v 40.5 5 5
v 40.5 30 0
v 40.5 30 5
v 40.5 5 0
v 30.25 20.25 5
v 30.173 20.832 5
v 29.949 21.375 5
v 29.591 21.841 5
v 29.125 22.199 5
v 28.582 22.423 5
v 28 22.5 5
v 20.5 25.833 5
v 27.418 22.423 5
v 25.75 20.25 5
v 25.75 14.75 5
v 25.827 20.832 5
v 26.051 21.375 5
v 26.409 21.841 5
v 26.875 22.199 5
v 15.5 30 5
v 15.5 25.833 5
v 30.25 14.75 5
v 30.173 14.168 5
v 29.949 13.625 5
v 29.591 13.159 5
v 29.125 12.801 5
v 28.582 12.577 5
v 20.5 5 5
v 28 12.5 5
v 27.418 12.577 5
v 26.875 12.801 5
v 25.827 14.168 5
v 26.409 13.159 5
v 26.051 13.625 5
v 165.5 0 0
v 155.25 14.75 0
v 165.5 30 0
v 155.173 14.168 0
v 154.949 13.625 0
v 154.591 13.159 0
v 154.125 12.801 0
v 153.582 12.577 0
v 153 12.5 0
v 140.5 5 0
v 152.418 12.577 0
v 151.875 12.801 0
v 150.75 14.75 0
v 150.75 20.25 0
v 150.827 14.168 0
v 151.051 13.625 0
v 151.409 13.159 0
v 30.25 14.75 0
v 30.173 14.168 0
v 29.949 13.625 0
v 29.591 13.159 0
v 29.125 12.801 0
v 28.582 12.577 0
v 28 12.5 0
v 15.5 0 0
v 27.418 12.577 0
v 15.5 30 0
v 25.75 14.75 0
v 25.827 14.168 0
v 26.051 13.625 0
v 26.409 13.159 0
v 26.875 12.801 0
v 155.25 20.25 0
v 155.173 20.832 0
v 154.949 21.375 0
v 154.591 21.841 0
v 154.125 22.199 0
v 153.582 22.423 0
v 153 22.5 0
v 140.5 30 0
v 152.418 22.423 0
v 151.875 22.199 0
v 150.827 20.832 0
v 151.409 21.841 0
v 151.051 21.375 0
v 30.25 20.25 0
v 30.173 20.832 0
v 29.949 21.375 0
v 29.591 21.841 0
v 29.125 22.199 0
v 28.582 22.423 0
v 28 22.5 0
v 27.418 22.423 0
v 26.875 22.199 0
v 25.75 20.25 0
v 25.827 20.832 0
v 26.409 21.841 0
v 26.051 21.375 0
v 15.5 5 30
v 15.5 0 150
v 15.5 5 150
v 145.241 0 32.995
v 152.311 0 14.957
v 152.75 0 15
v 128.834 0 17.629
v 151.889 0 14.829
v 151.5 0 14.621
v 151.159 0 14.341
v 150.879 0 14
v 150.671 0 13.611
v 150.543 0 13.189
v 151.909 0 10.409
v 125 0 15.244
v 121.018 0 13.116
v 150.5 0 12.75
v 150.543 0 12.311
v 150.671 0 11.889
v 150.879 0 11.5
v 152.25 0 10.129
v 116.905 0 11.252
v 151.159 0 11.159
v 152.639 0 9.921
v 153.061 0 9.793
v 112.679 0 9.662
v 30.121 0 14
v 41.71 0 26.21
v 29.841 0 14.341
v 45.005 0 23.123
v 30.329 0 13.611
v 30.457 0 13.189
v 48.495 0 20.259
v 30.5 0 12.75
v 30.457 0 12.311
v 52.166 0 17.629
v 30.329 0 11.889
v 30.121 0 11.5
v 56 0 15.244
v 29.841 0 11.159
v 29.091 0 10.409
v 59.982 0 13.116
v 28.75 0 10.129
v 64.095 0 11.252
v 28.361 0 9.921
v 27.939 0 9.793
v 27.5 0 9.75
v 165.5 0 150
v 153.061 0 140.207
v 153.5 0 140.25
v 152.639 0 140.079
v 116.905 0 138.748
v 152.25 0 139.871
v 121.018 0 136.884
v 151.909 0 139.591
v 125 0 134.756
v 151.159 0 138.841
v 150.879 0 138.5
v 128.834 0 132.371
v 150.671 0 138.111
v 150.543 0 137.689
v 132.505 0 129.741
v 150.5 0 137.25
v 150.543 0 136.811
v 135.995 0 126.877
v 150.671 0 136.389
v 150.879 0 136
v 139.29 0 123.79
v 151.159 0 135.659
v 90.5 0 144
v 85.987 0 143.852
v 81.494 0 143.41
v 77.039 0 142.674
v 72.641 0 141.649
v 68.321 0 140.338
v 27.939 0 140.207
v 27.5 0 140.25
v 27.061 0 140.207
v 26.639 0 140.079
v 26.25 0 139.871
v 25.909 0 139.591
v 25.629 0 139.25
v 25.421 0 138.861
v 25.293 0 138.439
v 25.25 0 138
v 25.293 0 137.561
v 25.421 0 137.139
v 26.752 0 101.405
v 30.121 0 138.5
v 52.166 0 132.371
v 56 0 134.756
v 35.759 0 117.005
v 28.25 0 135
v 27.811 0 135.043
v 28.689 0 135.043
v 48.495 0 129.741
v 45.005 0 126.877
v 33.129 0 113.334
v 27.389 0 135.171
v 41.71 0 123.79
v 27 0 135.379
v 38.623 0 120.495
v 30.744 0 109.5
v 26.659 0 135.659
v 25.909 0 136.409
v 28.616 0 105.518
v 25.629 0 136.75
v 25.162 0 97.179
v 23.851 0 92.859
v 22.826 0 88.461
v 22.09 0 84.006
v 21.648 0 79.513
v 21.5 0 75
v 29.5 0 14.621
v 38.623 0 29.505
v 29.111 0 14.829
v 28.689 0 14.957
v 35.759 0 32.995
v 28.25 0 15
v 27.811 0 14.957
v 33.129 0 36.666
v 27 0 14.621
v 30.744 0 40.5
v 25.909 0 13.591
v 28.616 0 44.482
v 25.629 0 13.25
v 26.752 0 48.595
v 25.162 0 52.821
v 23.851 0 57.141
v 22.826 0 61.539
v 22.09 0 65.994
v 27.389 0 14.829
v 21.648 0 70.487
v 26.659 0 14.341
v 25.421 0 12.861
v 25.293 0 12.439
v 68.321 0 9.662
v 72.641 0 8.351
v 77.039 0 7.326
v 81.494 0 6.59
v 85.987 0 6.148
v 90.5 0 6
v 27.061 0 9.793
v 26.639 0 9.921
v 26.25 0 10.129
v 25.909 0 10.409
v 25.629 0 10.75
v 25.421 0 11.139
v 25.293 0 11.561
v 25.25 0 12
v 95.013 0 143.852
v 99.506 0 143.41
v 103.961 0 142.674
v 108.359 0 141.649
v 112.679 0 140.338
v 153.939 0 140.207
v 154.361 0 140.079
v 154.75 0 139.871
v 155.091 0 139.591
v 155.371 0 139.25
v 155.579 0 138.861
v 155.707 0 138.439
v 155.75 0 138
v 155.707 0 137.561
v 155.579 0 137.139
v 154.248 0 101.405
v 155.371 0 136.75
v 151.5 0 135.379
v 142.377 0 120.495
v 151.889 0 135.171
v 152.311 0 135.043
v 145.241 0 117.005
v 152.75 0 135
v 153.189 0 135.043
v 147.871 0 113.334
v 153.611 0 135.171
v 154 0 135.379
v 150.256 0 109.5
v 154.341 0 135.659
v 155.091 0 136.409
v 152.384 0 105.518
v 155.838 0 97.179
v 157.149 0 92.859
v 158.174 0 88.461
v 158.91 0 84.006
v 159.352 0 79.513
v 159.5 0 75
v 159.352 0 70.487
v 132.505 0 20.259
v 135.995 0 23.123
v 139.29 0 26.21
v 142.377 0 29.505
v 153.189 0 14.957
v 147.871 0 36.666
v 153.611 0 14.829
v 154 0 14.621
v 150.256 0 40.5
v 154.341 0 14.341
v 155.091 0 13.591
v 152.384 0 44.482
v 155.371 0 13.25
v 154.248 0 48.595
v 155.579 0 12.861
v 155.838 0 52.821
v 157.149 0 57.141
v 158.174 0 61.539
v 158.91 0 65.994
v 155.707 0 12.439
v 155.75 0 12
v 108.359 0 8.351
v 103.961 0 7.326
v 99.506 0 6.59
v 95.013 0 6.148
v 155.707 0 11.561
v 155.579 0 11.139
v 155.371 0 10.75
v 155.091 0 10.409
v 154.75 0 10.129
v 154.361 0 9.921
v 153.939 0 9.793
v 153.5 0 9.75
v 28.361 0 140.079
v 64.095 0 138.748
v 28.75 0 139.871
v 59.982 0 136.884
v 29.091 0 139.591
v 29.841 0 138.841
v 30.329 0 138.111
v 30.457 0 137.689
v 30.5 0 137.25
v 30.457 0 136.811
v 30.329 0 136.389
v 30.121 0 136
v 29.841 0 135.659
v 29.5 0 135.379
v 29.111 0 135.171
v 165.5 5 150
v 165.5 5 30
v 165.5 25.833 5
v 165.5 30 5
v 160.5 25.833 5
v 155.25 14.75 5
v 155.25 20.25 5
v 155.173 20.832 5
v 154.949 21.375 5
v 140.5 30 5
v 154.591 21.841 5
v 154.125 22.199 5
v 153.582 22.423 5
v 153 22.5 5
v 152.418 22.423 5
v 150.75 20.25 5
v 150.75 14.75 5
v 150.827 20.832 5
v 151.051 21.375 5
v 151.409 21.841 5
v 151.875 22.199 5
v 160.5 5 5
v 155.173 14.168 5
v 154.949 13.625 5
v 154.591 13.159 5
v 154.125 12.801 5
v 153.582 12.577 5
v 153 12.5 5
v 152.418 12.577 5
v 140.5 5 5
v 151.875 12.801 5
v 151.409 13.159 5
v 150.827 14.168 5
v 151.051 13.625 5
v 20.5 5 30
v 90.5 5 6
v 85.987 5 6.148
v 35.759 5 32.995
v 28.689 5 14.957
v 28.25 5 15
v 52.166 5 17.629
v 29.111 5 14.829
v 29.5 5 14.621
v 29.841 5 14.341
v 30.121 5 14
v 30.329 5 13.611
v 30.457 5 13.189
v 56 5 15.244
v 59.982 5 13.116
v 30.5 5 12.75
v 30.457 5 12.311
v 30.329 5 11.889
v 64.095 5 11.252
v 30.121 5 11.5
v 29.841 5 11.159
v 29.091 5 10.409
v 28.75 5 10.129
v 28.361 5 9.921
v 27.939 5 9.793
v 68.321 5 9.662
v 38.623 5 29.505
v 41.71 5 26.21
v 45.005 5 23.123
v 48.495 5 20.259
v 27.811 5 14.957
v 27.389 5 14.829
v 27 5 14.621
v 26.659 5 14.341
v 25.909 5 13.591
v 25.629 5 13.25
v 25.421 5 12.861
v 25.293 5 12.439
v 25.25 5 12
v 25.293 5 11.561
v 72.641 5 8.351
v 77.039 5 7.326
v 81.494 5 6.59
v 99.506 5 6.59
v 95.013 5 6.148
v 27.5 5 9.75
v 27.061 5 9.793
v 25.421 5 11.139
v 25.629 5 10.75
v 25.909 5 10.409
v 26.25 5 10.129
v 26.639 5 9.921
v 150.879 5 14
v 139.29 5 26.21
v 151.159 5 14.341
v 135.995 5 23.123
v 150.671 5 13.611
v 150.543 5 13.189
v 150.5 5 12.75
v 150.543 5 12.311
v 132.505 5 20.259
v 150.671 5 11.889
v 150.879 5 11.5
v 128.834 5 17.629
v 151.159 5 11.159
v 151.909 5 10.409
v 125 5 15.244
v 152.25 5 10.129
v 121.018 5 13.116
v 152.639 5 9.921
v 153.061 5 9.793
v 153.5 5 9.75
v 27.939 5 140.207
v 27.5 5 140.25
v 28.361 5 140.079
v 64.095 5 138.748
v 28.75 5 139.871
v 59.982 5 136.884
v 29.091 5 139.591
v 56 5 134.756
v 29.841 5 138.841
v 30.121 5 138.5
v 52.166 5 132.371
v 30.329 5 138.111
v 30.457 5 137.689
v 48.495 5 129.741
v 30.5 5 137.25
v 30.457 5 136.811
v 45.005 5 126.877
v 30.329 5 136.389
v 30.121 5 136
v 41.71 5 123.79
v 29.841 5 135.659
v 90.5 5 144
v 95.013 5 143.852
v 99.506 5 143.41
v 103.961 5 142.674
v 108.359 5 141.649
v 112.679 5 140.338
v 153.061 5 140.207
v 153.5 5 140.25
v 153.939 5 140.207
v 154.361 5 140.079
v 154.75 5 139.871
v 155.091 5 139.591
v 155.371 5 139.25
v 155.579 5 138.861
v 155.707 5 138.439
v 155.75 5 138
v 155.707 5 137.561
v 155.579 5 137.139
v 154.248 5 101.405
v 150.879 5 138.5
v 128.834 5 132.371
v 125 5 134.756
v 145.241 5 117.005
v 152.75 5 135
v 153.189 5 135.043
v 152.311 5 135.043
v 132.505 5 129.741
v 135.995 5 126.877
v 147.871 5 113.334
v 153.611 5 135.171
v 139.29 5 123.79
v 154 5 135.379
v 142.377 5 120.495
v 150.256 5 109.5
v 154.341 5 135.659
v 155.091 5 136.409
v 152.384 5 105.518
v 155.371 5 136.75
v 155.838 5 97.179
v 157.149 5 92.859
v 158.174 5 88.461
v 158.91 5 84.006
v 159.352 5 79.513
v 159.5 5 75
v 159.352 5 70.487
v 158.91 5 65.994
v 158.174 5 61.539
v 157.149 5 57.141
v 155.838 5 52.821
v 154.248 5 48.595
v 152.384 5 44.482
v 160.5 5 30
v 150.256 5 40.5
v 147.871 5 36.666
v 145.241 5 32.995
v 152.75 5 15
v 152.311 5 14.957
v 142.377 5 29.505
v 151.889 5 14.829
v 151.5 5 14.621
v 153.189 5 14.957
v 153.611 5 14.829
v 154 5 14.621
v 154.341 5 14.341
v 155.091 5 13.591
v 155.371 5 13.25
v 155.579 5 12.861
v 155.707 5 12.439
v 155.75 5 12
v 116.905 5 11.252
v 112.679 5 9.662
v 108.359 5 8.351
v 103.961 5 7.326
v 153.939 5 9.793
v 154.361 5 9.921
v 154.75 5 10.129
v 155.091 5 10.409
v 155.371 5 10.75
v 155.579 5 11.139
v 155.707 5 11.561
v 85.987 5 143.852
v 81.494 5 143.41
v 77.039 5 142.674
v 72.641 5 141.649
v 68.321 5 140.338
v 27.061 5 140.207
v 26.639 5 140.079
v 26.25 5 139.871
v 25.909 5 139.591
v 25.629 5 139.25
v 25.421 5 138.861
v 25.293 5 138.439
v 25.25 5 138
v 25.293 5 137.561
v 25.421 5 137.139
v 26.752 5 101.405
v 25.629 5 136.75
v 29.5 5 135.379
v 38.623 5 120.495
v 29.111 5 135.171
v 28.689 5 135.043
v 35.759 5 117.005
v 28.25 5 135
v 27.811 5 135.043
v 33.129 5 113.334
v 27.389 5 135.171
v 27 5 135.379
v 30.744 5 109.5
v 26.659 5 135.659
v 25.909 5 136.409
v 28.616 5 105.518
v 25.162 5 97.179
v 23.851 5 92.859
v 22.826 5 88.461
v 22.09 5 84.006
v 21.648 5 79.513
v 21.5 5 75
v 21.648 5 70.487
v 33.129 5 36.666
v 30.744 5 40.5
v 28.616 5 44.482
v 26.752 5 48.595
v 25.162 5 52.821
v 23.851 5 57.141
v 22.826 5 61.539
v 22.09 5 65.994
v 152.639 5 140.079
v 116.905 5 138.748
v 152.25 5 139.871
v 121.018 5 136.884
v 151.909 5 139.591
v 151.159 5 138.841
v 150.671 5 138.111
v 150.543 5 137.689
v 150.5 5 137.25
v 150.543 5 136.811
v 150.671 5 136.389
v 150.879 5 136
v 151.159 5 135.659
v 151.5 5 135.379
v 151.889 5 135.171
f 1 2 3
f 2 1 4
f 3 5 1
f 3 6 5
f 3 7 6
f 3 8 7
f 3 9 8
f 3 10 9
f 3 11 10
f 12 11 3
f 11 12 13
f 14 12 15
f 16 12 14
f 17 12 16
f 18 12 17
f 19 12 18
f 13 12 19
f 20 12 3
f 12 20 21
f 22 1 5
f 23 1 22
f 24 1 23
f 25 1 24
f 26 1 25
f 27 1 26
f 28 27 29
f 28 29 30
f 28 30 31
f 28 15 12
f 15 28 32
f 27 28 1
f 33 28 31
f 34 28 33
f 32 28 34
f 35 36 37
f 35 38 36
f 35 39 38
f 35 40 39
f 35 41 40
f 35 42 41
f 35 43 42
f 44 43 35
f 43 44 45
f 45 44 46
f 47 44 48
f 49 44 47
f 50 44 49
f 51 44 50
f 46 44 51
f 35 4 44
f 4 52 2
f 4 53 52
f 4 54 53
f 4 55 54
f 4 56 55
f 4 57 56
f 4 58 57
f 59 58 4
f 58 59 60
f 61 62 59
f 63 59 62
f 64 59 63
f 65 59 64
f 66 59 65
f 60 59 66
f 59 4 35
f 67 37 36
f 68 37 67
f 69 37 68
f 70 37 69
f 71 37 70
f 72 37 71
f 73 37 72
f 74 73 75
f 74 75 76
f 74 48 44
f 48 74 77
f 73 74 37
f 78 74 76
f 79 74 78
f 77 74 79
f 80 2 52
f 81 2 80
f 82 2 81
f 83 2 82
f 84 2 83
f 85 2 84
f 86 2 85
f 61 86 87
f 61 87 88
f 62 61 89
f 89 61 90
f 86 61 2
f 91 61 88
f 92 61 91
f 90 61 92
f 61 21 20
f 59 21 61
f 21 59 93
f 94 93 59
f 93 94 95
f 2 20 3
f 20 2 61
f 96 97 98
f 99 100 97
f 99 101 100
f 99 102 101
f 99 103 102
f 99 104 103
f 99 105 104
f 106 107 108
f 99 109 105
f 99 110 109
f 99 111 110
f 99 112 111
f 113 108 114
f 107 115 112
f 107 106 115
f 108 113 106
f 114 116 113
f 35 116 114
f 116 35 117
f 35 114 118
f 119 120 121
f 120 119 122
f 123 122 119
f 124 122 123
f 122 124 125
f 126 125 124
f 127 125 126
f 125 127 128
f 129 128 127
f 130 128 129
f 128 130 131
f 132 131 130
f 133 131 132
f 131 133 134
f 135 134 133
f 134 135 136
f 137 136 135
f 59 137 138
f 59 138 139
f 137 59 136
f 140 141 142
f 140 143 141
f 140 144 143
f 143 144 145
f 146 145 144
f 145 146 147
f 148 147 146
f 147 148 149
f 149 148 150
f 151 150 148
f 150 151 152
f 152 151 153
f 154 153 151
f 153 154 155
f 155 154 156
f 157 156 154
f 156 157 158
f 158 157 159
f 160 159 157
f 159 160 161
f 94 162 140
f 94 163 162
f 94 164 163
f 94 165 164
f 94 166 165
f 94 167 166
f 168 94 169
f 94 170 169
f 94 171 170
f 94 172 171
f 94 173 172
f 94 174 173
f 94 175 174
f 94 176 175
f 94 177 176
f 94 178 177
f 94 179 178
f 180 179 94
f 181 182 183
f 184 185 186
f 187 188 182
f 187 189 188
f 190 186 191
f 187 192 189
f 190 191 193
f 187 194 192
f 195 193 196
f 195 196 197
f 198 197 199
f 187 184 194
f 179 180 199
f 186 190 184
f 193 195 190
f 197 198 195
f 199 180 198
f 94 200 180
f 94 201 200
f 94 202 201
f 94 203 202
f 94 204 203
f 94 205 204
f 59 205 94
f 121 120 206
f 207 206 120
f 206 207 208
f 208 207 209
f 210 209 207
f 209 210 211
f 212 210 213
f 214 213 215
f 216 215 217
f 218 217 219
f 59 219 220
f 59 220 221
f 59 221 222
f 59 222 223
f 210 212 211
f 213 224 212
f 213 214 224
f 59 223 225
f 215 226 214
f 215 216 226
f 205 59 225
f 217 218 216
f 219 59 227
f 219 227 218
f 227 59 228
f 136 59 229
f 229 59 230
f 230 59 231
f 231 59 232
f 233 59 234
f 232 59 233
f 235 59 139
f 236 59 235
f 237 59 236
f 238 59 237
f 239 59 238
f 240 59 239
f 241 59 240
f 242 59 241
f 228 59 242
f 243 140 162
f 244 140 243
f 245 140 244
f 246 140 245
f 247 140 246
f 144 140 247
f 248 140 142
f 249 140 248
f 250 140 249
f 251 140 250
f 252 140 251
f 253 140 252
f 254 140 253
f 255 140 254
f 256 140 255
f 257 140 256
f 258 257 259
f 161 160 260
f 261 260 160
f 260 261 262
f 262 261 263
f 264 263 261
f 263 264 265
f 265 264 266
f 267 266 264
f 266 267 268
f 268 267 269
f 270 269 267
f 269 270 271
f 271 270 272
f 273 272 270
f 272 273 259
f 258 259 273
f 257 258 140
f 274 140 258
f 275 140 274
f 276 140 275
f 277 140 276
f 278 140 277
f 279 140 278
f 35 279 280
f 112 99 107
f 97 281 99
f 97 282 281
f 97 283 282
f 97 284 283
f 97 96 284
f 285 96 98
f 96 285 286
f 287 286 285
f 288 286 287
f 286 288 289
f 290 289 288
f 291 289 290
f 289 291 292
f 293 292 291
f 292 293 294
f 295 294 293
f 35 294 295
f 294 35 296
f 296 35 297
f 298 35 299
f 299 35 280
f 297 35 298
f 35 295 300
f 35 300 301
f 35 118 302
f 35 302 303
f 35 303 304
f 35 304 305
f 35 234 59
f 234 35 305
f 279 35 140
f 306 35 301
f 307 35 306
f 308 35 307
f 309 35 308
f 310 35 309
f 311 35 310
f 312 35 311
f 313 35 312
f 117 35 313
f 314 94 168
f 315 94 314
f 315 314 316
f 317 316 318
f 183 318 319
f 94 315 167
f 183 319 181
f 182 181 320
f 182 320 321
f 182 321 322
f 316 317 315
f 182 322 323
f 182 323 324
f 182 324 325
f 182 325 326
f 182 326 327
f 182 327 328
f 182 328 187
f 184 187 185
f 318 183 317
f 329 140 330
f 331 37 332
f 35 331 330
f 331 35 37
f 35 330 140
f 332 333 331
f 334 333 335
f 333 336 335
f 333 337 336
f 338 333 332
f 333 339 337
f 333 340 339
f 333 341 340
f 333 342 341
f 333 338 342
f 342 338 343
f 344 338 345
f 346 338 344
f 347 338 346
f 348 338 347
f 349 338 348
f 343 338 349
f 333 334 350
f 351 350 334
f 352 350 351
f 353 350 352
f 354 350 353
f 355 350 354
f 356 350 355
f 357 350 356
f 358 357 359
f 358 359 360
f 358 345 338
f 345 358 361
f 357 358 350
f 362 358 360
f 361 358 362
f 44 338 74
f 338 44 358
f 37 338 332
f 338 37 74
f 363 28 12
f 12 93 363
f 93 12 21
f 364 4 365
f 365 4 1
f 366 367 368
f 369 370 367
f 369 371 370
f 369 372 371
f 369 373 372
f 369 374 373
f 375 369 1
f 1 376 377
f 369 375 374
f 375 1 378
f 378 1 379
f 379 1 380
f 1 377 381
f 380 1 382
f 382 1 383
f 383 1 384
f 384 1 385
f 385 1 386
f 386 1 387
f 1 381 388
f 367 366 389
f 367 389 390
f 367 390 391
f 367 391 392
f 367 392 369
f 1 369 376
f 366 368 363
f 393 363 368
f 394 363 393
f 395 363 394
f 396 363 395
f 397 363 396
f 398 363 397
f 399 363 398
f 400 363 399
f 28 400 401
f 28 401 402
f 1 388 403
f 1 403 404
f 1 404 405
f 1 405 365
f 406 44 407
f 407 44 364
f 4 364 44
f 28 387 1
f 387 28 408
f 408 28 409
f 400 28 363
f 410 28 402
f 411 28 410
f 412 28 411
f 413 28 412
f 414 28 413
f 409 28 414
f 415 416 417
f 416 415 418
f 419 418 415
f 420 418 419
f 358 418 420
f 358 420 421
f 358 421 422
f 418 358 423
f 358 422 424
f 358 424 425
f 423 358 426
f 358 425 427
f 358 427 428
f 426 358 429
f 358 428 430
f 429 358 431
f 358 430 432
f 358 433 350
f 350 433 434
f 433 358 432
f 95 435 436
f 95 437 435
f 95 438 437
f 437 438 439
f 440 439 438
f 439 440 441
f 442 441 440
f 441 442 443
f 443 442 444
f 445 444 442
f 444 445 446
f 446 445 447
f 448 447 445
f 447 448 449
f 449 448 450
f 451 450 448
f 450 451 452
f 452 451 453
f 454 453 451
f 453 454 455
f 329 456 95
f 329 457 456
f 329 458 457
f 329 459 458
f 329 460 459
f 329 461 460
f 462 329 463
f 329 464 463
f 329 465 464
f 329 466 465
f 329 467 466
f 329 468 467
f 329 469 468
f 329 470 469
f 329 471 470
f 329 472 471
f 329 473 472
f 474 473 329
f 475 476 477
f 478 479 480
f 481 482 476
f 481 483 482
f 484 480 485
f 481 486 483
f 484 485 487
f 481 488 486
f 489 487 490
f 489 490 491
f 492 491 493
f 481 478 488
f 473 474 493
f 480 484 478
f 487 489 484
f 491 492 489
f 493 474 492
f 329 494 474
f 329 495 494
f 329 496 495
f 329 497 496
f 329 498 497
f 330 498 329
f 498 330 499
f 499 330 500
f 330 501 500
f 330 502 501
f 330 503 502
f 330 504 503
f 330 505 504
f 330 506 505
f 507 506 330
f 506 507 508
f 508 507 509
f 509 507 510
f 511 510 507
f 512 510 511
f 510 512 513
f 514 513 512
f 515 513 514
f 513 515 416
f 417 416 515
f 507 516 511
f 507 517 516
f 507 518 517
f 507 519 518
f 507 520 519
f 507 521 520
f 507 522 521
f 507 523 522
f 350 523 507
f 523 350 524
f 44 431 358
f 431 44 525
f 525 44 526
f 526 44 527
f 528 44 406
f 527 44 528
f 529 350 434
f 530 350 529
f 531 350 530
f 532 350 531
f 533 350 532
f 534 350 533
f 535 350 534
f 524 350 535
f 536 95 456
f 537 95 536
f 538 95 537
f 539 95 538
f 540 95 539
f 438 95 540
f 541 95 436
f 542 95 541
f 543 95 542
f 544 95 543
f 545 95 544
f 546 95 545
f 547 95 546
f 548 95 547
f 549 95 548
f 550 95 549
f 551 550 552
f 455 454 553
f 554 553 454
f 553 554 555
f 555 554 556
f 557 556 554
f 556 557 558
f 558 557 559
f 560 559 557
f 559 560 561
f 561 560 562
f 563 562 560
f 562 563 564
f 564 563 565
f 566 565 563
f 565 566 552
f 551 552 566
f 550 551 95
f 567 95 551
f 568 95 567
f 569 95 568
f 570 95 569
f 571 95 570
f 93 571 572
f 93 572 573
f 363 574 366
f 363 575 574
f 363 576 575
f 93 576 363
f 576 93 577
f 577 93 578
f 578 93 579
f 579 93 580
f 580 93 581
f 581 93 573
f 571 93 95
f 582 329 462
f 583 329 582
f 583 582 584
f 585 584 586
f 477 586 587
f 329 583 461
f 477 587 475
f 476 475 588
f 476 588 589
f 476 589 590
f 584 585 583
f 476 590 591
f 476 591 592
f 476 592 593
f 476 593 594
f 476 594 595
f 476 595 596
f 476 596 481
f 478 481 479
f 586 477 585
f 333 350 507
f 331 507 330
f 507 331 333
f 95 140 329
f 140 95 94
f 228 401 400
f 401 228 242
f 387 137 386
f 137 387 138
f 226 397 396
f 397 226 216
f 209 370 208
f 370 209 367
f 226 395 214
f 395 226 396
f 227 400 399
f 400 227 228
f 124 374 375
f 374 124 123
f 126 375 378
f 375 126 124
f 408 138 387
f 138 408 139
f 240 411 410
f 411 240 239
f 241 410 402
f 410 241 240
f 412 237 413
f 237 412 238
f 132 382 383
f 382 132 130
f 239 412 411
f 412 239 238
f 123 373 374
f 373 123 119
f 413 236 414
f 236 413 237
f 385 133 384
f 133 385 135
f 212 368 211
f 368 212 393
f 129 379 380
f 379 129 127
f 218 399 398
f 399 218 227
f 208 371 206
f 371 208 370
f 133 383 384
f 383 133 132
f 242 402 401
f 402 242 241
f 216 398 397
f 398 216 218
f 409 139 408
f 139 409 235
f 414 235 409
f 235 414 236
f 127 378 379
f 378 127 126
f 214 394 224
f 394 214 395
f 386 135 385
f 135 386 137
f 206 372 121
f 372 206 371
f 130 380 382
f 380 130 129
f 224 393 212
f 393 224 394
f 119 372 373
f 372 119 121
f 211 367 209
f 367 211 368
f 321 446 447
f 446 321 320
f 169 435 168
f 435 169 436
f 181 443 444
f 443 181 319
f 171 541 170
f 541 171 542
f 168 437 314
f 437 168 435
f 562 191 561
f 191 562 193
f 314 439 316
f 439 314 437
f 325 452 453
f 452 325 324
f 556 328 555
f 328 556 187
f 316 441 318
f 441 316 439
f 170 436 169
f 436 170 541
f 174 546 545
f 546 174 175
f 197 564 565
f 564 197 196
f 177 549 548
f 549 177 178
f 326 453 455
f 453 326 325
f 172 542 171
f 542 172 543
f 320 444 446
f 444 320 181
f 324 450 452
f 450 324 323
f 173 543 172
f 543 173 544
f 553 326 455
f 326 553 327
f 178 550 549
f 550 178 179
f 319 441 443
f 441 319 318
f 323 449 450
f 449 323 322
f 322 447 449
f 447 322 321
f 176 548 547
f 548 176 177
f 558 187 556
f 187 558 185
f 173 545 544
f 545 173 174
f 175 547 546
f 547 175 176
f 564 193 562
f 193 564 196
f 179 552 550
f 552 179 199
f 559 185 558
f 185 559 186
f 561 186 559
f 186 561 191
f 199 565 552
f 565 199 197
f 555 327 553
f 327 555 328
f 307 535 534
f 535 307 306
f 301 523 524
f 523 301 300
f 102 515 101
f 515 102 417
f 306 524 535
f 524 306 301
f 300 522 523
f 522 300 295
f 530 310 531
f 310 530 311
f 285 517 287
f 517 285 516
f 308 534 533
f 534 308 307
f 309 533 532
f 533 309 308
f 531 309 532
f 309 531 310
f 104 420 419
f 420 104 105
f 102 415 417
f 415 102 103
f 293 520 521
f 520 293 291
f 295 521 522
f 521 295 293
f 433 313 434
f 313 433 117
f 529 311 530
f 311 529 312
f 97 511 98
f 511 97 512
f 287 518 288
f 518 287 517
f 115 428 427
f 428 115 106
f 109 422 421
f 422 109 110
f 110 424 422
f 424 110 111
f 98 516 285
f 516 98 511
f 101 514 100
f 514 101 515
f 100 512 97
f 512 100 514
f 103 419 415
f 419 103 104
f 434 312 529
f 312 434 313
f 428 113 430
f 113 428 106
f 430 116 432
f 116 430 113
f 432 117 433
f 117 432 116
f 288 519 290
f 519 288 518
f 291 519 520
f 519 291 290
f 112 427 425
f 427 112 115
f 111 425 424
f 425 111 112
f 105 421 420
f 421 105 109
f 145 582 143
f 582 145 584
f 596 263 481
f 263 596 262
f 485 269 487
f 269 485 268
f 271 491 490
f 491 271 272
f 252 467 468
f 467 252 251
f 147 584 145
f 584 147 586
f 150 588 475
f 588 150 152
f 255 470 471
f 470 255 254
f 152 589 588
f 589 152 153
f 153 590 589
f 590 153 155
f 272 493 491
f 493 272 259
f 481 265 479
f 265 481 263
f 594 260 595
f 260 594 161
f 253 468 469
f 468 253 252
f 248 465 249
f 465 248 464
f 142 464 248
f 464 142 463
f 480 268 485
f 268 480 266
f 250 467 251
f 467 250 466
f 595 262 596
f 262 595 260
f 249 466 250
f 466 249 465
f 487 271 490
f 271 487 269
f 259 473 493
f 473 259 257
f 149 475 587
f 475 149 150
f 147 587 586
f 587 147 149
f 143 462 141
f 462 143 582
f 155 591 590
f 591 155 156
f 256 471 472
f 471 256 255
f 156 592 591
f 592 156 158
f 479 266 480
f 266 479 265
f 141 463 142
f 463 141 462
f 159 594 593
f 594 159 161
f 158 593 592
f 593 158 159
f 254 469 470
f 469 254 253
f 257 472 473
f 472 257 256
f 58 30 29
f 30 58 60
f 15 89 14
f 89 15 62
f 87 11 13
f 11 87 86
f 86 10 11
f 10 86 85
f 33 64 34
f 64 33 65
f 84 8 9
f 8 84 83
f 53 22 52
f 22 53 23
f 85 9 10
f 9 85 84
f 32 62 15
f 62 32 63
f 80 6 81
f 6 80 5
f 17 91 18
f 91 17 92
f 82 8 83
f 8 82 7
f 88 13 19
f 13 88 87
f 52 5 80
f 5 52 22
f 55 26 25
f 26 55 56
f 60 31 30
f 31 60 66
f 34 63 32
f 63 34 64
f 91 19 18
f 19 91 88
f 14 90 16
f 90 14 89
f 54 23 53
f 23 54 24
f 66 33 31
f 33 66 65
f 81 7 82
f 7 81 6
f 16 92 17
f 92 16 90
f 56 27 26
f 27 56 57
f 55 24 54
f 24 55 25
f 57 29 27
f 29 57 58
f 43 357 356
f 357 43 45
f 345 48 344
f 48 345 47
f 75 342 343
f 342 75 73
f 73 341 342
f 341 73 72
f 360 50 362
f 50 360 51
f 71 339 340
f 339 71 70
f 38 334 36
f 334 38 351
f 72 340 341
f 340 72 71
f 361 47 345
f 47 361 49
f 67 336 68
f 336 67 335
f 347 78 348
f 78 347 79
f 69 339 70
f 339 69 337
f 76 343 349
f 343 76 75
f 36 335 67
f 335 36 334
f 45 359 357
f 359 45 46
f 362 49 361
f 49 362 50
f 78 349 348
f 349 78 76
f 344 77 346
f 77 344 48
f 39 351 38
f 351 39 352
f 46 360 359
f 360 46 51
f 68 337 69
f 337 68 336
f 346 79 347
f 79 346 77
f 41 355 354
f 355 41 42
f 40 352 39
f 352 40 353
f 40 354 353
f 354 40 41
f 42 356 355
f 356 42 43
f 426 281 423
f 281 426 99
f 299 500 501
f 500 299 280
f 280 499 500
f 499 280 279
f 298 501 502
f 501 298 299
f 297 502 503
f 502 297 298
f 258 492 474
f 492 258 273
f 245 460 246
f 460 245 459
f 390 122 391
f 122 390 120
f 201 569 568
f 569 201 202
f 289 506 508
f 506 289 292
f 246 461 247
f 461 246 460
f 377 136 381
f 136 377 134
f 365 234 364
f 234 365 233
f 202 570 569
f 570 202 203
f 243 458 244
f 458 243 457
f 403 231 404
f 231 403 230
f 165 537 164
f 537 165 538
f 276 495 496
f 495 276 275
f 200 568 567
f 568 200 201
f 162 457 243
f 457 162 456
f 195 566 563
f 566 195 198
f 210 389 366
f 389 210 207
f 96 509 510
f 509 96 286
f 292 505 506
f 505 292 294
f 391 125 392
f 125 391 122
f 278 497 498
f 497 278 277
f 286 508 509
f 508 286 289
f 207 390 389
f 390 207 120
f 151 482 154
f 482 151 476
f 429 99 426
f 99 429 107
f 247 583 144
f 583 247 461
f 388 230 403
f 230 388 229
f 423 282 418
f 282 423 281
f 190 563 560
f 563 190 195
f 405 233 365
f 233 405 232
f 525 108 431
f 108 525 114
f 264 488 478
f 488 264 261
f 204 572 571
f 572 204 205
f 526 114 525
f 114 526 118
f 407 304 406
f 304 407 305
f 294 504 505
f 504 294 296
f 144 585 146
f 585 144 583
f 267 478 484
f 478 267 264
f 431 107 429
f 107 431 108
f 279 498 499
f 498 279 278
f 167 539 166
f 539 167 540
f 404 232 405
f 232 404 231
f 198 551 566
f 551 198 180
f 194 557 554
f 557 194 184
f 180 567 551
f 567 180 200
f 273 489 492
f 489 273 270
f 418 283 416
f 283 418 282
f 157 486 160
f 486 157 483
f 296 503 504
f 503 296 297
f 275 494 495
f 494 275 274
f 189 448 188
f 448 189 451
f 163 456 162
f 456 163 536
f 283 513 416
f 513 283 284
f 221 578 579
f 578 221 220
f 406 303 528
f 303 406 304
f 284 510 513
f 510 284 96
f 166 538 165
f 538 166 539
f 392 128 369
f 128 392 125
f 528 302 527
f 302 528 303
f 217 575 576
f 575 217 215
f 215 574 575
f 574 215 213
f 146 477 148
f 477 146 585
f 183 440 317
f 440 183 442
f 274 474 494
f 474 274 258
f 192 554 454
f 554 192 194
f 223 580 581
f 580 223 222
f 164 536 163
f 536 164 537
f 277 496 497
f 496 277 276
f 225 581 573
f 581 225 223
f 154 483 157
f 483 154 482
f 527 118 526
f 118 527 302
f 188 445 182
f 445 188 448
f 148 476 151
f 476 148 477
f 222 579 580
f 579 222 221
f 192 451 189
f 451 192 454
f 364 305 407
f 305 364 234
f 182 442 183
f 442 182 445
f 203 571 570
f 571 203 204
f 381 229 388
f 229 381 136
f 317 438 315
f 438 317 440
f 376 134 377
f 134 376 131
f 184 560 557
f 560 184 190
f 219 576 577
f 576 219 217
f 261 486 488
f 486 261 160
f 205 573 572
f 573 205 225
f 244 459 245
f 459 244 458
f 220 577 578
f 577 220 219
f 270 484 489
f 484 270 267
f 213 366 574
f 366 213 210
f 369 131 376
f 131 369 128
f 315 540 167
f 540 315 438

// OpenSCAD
// file: lib/shapes.scad
/*
 * Вспомогательные примитивы. Подключать через use <lib/shapes.scad>.
 */

// Прямоугольник со скруглёнными углами, центрированный в (0,0)
module rrect(w, h, r, fn = 32) {
    r_ = min(r, w / 2 - 0.01, h / 2 - 0.01);
    hull()
        for (sx = [-1, 1], sy = [-1, 1])
            translate([sx * (w / 2 - r_), sy * (h / 2 - r_)])
                circle(r = r_, $fn = fn);
}

// Капсула (slot) длиной l по X, шириной w, центрирована
module slot2d(l, w, fn = 24) {
    hull()
        for (sx = [-1, 1])
            translate([sx * (l - w) / 2, 0]) circle(d = w, $fn = fn);
}

// Скруглённый по вертикальным рёбрам параллелепипед, угол в начале координат
module rbox(size, r, fn = 32) {
    translate([size[0] / 2, size[1] / 2, 0])
        linear_extrude(height = size[2])
            rrect(size[0], size[1], r, fn);
}

// Плавная интерполяция (нулевой наклон на концах → эквивалент большого радиуса)
function smoothstep(t) = t * t * (3 - 2 * t);
function lerp(a, b, t) = a + (b - a) * t;

/*
 * Лофт по Y между двумя скруглёнными прямоугольниками в плоскости XZ.
 * Сечение задано: центр [cx, cz], ширина w, высота h, радиус r.
 * Профиль перехода: smoothstep → тангенциально-непрерывный вход и выход.
 * y0..y1 — продольные координаты. n — число ломтей.
 */
module loft_xz(y0, y1, s0, s1, n = 24, fn = 32) {
    L = y1 - y0;
    for (i = [0 : n - 1]) {
        t0 = i / n;
        t1 = (i + 1) / n;
        hull() {
            section_slab(y0 + t0 * L, s0, s1, smoothstep(t0), fn);
            section_slab(y0 + t1 * L, s0, s1, smoothstep(t1), fn);
        }
    }
}

// Тонкий ломоть сечения на координате y, s = [cx, cz, w, h, r]
module section_slab(y, s0, s1, u, fn) {
    cx = lerp(s0[0], s1[0], u);
    cz = lerp(s0[1], s1[1], u);
    w  = lerp(s0[2], s1[2], u);
    h  = lerp(s0[3], s1[3], u);
    r  = lerp(s0[4], s1[4], u);
    translate([cx, y, cz])
        rotate([90, 0, 0])
            translate([0, 0, -0.005])
                linear_extrude(height = 0.01)
                    rrect(w, h, r, fn);
}

// Отверстие вдоль Y (сквозное), центр (x, z), на глубине от y0 длиной l
module hole_y(x, z, d, y0, l, fn = 32) {
    translate([x, y0 - 0.01, z])
        rotate([-90, 0, 0])
            cylinder(h = l + 0.02, d = d, $fn = fn);
}

// Шестигранное гнездо под гайку вдоль Y
module hex_pocket_y(x, z, af, h, y0) {
    translate([x, y0 - 0.01, z])
        rotate([-90, 0, 0])
            cylinder(h = h + 0.01, d = af / cos(30), $fn = 6);
}

// --- Макеты (не для печати) -------------------------------------------------
module fan_mockup(size = 140, t = 25, hub = 45, hole_pitch = 124.5) {
    // Рамка
    color([0.08, 0.08, 0.09, 0.9])
    difference() {
        translate([0, t, 0]) rotate([90, 0, 0])
            linear_extrude(height = t) rrect(size, size, 6);
        translate([0, t + 0.1, 0]) rotate([90, 0, 0])
            linear_extrude(height = t + 0.2) circle(d = size - 3, $fn = 96);
        for (sx = [-1, 1], sz = [-1, 1])
            hole_y(sx * hole_pitch / 2, sz * hole_pitch / 2, 4.4, -1, t + 2);
    }
    // Ступица и лопасти (условно)
    color([0.45, 0.35, 0.25, 0.95])
    translate([0, t / 2, 0]) rotate([90, 0, 0]) {
        cylinder(h = t * 0.6, d = hub, center = true, $fn = 48);
        for (i = [0 : 6])
            rotate(i * 360 / 7)
                hull() {
                    translate([hub / 2 - 2, -3, 0]) cylinder(h = 2, r = 3, center = true);
                    translate([size / 2 - 10, 10, 0]) cylinder(h = 2, r = 6, center = true);
                }
    }
}

// Паз отверстия вентилятора: hull двух окружностей на межцентровых pmin и pmax
// (sx, sz — квадрант, ±1). 2D, центр вентилятора в (0,0).
module fan_hole_slot2d(sx, sz, pmin, pmax, d, fn = 24) {
    hull() for (p = [pmin, pmax]) translate([sx * p / 2, sz * p / 2]) circle(d = d, $fn = fn);
}

/*
 * Макет MSI EdgeXpert по замерам. Начало координат — левый-передний-нижний угол
 * КОРПУСА (без ножек); ножки уходят в −z. «Левый» — при взгляде спереди.
 *   hc = [w, h, z0]           — сотовая полоса на передней грани (центр по ширине)
 *   bv = [w, d, x0, y0]       — нижняя решётка (x0 от левого края, y0 от передней грани)
 *   rx = [w, h, top]          — задний выхлоп (центр по ширине, top — от верха)
 *   ft = [dia, h, inset_x, inset_y]
 */
module device_mockup(w, d, h, hc, bv, rx, ft) {
    color([0.14, 0.15, 0.16, 0.85]) cube([w, d, h]);
    color([0.35, 0.65, 0.95, 0.95])            // соты — вход
        translate([(w - hc[0]) / 2, -0.4, hc[2]]) cube([hc[0], 0.4, hc[1]]);
    color([0.95, 0.45, 0.3, 0.95])             // задний выхлоп
        translate([(w - rx[0]) / 2, d, h - rx[2] - rx[1]]) cube([rx[0], 0.4, rx[1]]);
    color([0.35, 0.65, 0.95, 0.95])            // нижняя решётка
        translate([bv[2], bv[3], -0.4]) cube([bv[0], bv[1], 0.4]);
    color([0.2, 0.2, 0.2])                     // ножки
        for (fx = [ft[2], w - ft[2]], fy = [ft[3], d - ft[3]])
            translate([fx, fy, -ft[1]]) cylinder(h = ft[1], d = ft[0], $fn = 32);
}
// main file
/*
 * fan_bracket.scad — ОПЦИЯ: рамка 140-мм вентилятора для настольного стенда
 * (испытания тракта без панели ФП-5). В 5U-модуле роль рамки играет панель.
 *
 * Схема «сэндвич»: [рамка] – [вентилятор 25 мм] – [входной фланец воздуховода].
 * 4 болта M4×45 проходят через рамку и штатные угловые отверстия вентилятора
 * в гайки (гнёзда) входного фланца воздуховода. Вентилятор меняется без
 * перепечатки воздуховода. Рамка стоит на двух лапках с пазами M4 к дну.
 *
 * Проём 138 мм без решётки (ТЗ п.7, п.23). Опциональная защитная решётка
 * — покупная проволочная 140 мм под те же 4 болта.
 *
 * Локальные координаты: x=0 — левая грань трака, y=0 — передняя грань рамки
 * (плоскость всасывания), z=0 — верх плиты/стола стенда.
 */

include <params.scad>
use <lib/shapes.scad>

part = "bracket"; // [bracket, bracket_with_fan]

fan_floor_clearance = fan_center_zl - fan_size / 2;   // 5 над плитой (стенд стоит на плите/столе)
bracket_t = 5;
bracket_foot_w = 25;
bracket_foot_d = 30;
hole_d = fan_hole_dia;

frame_w = fan_size + 2 * holder_wall;   // 150
frame_z0 = fan_floor_clearance - holder_wall;  // низ рамки (0 при зазоре 5 и стенке 5)
frame_h  = fan_size + 2 * holder_wall;

module bracket() {
    difference() {
        union() {
            // Плита рамки
            translate([track_cx, 0, 0])
                translate([-frame_w / 2, 0, max(0, frame_z0)])
                    cube([frame_w, bracket_t, frame_h - max(0, -frame_z0)]);
            // Лапки к дну
            for (sx = [-1, 1])
                translate([track_cx + sx * (frame_w / 2 - bracket_foot_w / 2) - bracket_foot_w / 2, 0, 0])
                    cube([bracket_foot_w, bracket_foot_d, holder_floor_t]);
            // Косынки лапок
            for (sx = [-1, 1])
                translate([track_cx + sx * (frame_w / 2 - 2.5), bracket_t, 0])
                    rotate([90, 0, 90])
                        linear_extrude(height = 5, center = true)
                            polygon([[0, 0], [bracket_foot_d - bracket_t, 0], [0, 30]]);
        }
        // Проём
        hole_y(track_cx, fan_center_zl, fan_open_dia, -1, bracket_t + 2, 96);
        // 4 паза вентилятора (межцентровое 124.5…126)
        for (sx = [-1, 1], sz = [-1, 1])
            hull() for (pt = [fan_hole_pitch_min, fan_hole_pitch_max])
                hole_y(track_cx + sx * pt / 2, fan_center_zl + sz * pt / 2, hole_d, -1, bracket_t + 2);
        // Пазы M4 в лапках
        for (sx = [-1, 1])
            translate([track_cx + sx * (frame_w / 2 - bracket_foot_w / 2), bracket_t + (bracket_foot_d - bracket_t) / 2, -0.01])
                linear_extrude(height = holder_floor_t + 0.02)
                    rotate(90) slot2d(10, m4_clear_d);
    }
}

module bracket_with_fan() {
    bracket();
    translate([track_cx, y_fan_front, fan_center_zl])
        fan_mockup(fan_size, fan_thickness, fan_hub_dia, fan_hole_pitch);
}

echo(str("[BRACKET] frame ", frame_w, " x ", frame_h, " x ", bracket_t,
         " mm; opening ", fan_open_dia, "; slots ", hole_d, " @ ", fan_hole_pitch_min, "…", fan_hole_pitch_max,
         "; fan center z=", fan_center_zl));

if (part == "bracket_with_fan") bracket_with_fan();
else bracket();
